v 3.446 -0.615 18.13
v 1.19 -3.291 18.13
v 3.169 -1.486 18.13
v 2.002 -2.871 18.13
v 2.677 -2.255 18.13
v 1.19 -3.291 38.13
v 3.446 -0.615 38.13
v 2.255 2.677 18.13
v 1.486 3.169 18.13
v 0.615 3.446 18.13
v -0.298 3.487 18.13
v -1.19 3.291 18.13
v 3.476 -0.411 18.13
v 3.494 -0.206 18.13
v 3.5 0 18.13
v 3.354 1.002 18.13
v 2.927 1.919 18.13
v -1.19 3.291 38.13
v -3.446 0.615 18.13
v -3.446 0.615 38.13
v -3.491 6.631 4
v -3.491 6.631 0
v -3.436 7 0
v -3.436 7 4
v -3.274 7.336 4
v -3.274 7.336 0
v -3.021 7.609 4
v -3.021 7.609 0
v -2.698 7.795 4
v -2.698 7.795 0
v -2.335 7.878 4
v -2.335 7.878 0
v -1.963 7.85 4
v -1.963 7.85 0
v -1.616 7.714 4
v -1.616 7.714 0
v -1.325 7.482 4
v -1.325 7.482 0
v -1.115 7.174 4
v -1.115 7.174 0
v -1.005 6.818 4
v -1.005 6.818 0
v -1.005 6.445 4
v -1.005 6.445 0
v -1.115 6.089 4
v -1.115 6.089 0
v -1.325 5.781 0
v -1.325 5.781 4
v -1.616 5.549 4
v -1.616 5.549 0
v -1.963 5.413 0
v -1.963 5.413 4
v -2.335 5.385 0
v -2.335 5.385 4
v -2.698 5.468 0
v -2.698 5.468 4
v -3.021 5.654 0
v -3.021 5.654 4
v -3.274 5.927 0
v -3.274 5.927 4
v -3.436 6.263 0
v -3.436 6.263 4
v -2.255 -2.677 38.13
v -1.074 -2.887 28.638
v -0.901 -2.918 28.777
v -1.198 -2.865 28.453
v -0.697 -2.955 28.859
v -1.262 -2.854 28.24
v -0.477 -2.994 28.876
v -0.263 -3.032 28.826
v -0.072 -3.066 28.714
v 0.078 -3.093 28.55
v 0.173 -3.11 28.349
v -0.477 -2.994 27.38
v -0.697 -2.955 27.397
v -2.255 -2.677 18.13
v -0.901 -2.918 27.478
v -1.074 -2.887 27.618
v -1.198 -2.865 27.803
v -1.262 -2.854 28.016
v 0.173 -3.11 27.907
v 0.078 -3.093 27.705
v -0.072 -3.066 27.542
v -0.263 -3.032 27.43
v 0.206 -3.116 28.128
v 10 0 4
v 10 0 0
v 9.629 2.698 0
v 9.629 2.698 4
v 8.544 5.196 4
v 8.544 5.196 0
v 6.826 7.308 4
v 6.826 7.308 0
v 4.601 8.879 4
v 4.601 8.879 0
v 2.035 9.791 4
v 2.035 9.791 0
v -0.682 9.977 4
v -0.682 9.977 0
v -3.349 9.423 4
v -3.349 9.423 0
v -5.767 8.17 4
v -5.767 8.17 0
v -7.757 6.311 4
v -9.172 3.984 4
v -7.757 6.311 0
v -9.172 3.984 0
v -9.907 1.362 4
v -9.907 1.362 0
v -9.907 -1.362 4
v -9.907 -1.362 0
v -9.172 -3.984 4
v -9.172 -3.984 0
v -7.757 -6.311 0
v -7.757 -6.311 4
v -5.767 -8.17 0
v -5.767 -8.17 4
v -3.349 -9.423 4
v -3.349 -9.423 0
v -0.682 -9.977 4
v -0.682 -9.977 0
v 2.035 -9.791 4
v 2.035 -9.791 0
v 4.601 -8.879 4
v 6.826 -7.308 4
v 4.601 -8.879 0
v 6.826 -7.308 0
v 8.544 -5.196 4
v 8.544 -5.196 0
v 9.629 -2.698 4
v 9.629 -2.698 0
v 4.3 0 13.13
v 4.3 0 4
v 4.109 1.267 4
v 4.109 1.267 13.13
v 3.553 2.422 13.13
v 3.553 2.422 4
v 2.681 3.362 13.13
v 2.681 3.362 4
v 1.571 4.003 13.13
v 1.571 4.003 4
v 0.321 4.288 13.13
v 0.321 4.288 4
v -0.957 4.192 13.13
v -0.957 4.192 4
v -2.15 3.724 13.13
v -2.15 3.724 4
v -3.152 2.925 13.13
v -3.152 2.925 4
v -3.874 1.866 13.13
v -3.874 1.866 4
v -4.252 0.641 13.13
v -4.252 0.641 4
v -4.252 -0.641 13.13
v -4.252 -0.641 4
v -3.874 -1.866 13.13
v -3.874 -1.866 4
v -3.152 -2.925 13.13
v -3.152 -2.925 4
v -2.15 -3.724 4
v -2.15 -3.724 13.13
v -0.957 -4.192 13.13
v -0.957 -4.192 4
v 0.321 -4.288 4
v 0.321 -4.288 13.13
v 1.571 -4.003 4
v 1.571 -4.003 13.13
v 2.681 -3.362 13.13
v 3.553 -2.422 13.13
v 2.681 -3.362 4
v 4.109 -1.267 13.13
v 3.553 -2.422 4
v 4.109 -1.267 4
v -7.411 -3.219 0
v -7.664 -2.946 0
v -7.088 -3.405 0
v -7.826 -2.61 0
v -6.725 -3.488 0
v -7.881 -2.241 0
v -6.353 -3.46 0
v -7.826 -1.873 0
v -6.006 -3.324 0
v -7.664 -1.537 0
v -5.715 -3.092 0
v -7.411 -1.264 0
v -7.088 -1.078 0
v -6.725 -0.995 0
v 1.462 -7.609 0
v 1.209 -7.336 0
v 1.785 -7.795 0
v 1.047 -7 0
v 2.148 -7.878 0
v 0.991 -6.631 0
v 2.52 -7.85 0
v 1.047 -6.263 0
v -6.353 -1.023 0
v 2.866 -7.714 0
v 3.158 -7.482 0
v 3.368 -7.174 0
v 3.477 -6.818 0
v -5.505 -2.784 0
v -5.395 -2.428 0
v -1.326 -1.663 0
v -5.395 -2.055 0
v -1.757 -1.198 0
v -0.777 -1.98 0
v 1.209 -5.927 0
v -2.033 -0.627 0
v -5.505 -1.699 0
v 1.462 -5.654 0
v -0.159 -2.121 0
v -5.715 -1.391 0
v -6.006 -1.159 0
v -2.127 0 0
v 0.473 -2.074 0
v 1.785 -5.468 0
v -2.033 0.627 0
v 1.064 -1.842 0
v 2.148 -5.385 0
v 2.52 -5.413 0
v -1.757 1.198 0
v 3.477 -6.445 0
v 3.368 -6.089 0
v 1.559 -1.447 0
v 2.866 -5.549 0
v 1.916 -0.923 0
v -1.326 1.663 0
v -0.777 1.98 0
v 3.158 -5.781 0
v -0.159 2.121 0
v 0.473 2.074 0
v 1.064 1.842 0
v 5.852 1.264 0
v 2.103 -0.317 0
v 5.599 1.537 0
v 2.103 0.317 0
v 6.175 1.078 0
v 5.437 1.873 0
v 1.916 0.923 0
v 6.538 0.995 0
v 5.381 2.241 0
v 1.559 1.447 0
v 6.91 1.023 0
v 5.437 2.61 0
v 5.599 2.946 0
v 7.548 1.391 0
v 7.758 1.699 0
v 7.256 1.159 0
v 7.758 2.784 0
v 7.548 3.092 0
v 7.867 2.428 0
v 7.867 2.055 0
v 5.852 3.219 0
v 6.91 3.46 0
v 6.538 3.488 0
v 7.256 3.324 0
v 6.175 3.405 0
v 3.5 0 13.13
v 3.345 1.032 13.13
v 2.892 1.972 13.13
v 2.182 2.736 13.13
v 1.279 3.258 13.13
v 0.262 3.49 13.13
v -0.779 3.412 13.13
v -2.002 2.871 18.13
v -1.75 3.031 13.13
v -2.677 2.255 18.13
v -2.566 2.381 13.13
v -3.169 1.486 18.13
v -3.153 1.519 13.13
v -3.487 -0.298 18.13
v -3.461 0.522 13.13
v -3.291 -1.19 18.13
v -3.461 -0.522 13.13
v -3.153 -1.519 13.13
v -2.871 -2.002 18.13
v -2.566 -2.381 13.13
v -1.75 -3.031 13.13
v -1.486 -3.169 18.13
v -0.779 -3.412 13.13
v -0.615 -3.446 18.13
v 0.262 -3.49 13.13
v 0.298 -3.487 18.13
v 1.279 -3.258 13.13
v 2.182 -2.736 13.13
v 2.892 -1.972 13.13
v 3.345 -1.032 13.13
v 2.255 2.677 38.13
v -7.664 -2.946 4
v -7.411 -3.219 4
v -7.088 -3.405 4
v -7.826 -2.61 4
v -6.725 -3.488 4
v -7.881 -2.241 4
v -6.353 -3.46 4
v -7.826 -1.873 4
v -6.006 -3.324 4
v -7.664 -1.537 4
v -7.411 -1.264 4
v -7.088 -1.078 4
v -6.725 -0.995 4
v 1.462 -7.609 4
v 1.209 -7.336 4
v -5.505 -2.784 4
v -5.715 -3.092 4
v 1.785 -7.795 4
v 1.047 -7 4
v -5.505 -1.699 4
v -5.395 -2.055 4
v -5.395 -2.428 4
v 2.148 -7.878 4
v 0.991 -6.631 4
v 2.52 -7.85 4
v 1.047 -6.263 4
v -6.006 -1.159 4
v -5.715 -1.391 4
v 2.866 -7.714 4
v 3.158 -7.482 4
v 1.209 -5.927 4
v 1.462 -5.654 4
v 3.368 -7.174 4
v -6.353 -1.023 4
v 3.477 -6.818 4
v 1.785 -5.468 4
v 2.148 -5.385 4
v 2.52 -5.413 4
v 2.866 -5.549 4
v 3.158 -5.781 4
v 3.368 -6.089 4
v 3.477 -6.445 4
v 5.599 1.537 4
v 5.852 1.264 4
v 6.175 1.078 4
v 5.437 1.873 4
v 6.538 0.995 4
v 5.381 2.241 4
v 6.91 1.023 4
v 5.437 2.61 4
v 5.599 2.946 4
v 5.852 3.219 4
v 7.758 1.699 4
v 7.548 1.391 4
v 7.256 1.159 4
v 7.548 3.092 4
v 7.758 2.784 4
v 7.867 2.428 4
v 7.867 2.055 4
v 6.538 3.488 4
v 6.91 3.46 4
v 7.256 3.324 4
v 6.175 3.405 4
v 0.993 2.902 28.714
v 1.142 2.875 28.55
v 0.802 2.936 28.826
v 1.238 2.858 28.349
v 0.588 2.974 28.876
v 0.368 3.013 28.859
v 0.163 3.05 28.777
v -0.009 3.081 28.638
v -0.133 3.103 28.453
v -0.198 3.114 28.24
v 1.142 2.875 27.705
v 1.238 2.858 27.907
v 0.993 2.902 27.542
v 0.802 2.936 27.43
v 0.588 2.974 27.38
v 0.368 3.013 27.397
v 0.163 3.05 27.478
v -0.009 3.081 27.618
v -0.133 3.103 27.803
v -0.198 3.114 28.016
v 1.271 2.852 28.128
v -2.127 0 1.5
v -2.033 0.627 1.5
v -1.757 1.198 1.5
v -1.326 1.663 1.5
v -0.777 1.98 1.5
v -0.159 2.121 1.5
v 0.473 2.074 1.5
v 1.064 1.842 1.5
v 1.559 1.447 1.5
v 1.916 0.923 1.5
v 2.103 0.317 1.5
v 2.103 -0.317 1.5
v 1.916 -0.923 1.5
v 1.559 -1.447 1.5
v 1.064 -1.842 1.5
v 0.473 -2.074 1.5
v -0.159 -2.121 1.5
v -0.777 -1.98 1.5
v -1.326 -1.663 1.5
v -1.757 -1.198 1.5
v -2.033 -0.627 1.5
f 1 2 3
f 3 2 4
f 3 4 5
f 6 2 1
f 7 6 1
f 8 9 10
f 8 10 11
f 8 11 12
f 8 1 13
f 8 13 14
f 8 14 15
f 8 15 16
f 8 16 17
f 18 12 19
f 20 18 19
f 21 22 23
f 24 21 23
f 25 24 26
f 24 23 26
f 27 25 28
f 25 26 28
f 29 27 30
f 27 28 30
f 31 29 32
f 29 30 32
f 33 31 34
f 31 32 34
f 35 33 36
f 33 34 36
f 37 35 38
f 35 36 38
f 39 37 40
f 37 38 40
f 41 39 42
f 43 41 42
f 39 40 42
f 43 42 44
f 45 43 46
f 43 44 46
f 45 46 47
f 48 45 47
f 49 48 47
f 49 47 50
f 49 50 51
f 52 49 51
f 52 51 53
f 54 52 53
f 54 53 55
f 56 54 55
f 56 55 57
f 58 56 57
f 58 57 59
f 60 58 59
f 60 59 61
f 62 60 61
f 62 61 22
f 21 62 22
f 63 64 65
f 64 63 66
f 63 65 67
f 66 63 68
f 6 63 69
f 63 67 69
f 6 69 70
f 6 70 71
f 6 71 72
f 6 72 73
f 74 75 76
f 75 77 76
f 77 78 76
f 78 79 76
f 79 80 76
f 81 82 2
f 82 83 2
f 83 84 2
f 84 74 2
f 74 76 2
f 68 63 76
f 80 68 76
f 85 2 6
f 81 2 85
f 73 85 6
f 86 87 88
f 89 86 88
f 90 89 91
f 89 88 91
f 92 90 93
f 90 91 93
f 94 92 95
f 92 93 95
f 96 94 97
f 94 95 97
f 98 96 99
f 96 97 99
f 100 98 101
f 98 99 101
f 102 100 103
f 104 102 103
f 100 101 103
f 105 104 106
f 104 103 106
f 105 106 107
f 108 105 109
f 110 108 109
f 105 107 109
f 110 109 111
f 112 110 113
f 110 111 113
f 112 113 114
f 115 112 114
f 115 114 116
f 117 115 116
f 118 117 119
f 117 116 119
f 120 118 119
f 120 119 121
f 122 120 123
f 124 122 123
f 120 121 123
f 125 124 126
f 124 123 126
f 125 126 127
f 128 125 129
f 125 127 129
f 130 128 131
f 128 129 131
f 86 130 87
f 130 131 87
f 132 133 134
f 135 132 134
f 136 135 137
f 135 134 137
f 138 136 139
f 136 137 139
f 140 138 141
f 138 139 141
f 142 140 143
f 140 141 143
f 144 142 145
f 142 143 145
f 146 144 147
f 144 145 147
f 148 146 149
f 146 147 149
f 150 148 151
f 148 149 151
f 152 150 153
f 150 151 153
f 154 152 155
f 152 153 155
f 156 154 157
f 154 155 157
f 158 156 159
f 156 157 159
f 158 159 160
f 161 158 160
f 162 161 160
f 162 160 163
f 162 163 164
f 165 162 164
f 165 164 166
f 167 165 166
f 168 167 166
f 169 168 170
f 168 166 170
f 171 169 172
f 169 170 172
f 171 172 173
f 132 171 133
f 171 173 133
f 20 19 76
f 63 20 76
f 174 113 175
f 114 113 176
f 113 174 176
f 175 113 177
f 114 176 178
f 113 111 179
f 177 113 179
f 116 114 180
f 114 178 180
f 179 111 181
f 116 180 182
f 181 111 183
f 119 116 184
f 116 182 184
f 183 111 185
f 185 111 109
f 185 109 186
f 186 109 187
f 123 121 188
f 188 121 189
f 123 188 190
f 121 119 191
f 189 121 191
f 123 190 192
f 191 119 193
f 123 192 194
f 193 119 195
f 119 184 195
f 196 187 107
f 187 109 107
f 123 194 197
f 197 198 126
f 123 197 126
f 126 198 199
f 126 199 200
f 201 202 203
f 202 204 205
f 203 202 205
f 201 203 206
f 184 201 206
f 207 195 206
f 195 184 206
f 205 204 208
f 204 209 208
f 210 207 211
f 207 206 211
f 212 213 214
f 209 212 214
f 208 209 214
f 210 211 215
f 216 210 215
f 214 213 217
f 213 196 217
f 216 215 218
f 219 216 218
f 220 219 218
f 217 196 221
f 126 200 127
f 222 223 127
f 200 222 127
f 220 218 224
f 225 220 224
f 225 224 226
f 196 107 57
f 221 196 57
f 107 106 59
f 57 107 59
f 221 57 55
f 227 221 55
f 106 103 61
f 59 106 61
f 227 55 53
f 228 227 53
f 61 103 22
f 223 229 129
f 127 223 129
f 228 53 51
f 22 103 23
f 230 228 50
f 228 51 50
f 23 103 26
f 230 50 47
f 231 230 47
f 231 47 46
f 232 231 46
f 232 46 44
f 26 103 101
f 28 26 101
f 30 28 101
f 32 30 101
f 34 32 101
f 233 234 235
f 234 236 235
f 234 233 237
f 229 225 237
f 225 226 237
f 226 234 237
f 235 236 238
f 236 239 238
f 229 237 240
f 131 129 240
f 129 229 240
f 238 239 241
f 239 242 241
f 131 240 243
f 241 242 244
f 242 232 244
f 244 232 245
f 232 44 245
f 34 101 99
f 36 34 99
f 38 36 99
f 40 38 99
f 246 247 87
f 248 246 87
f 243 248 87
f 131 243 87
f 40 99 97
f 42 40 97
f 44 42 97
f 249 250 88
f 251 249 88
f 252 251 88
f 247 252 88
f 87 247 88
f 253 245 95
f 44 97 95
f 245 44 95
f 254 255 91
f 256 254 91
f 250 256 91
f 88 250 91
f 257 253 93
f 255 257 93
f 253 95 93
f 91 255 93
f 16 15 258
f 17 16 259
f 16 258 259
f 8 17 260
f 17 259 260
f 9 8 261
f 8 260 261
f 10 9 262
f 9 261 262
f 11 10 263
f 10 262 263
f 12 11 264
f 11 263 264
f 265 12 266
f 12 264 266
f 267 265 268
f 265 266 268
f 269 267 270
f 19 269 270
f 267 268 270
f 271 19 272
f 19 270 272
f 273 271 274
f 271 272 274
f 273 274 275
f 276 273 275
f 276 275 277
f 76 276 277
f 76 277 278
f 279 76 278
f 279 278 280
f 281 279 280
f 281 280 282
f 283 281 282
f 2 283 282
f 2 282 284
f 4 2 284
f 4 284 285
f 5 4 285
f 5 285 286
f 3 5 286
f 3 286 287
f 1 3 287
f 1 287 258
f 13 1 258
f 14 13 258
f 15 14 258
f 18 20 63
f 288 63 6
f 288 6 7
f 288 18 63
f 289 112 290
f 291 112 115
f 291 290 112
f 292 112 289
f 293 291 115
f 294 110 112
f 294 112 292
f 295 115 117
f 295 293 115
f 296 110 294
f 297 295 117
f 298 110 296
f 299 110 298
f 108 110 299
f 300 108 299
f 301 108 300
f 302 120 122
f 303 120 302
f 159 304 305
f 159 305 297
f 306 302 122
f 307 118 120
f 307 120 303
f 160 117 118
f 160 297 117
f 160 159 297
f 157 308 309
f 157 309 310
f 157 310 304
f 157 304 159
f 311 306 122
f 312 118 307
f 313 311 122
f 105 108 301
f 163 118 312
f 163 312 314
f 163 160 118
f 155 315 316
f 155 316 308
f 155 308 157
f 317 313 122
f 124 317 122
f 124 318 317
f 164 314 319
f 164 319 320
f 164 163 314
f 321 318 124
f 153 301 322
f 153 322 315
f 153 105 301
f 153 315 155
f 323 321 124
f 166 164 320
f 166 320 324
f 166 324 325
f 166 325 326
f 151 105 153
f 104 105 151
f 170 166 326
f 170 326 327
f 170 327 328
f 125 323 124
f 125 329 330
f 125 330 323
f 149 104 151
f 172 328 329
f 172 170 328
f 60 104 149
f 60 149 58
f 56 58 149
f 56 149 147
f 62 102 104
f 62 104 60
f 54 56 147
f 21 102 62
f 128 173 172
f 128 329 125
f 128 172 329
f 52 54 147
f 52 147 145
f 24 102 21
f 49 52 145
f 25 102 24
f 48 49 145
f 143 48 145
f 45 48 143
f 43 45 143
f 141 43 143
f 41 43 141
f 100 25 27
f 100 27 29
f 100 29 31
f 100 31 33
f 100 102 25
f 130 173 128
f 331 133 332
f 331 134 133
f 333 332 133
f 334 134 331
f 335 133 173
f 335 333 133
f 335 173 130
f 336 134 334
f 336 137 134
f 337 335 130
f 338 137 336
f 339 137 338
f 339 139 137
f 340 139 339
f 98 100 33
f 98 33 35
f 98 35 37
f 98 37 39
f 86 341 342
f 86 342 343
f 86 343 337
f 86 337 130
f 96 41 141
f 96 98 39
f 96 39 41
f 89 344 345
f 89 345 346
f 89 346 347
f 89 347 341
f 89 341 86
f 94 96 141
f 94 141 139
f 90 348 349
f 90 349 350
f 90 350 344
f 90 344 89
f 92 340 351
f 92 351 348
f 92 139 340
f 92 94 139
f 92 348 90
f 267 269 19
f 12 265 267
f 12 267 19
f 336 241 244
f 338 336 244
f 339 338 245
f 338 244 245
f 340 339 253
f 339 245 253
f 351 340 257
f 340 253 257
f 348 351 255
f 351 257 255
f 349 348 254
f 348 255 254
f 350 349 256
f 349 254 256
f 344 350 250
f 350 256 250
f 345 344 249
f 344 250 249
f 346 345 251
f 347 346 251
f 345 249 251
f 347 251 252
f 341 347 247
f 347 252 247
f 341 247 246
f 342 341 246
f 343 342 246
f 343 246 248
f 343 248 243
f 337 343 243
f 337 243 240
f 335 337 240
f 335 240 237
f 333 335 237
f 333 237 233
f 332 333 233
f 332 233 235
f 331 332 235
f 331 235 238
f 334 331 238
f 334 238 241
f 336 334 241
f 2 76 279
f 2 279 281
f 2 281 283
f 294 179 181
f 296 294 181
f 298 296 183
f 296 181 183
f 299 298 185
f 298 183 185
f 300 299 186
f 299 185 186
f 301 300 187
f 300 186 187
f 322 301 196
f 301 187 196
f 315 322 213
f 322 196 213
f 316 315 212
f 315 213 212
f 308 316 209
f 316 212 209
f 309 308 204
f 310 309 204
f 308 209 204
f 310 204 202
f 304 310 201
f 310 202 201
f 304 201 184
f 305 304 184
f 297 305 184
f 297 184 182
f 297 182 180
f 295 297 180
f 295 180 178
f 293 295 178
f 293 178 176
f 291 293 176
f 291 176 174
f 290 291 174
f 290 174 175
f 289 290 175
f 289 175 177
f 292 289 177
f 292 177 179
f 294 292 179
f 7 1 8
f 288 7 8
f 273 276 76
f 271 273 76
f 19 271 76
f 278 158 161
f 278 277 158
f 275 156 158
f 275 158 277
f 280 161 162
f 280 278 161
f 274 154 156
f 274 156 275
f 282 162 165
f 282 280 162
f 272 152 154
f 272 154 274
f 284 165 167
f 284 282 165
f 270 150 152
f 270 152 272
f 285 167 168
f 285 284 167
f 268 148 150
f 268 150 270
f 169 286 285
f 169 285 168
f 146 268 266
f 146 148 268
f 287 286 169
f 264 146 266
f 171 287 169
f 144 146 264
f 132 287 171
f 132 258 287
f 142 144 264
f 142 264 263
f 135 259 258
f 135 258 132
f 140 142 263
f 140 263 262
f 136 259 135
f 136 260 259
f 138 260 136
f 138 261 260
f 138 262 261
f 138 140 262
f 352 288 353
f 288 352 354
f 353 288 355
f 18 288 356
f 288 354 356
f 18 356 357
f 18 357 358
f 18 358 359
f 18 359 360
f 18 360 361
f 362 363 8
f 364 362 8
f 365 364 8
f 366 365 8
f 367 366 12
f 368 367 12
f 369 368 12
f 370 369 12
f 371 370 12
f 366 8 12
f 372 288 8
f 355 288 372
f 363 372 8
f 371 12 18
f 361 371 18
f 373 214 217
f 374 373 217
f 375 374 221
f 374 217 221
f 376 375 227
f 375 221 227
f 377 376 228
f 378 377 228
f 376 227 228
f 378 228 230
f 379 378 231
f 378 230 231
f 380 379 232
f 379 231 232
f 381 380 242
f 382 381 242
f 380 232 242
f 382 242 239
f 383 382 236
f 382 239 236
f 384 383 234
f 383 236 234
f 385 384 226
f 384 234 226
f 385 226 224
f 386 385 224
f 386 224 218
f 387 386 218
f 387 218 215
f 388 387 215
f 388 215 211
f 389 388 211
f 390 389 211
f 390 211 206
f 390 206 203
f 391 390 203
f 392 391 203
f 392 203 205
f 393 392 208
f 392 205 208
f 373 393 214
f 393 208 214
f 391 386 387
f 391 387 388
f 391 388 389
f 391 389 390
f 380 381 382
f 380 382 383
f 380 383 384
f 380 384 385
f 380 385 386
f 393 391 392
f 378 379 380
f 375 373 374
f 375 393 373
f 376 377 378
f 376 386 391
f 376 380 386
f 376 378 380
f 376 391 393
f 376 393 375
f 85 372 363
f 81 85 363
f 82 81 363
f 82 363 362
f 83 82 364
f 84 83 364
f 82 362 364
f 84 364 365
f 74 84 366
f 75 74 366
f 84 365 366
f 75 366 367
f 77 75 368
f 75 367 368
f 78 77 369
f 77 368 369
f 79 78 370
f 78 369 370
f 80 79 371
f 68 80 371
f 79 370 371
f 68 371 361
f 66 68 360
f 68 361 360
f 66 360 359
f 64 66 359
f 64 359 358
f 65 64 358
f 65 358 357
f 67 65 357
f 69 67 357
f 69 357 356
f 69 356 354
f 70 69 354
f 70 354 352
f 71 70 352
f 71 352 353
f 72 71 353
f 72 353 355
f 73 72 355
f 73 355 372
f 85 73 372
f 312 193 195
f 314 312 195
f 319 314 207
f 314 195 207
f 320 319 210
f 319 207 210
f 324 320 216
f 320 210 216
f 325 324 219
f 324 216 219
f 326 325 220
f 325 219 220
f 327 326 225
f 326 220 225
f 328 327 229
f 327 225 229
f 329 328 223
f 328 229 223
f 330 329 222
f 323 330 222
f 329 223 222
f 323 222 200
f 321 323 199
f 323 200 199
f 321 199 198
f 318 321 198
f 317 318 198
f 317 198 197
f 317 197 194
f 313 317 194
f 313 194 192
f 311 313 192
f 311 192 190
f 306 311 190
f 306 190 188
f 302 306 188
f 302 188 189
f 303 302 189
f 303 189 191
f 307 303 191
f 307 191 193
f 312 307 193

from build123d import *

# Parameters (mm, degrees)
ESQUISSE1_R             = 10
BOSS_EXTRU_1_DEPTH      = 4
ESQUISSE2_R             = 3.5
BOSS_EXTRU_2_DEPTH      = 14.13
BOSS_EXTRU_3_DEPTH      = 20
ESQUISSE4_R             = 1.25
ENL_V_MAT_EXTRU_1_DEPTH = 100
ESQUISSE5_R             = 0.75
ENL_V_MAT_EXTRU_2_DEPTH = 14
ESQUISSE6_R             = 2.127089322
ENL_V_MAT_EXTRU_3_DEPTH = 1.5
ESQUISSE7_R             = 4.3
ESQUISSE7_R_2           = 3.5
BOSS_EXTRU_4_DEPTH      = 9.13


with BuildPart() as part:
    # Esquisse1 → Boss.-Extru.1 (new body)
    with BuildSketch(Plane.XY):
        Circle(ESQUISSE1_R)
    extrude(amount=BOSS_EXTRU_1_DEPTH)

    # Esquisse2 → Boss.-Extru.2 (add)
    with BuildSketch(Plane.XY.offset(4)):
        Circle(ESQUISSE2_R)
    extrude(amount=BOSS_EXTRU_2_DEPTH)

    # Esquisse3 → Boss.-Extru.3 (add)
    with BuildSketch(Plane.XY.offset(18.13)):
        Polygon((-1.190476286, 3.29131679), (-3.445602095, 0.614675689), (-2.255125809, -2.676641101), (1.190476286, -3.29131679), (3.445602095, -0.614675689), (2.255125809, 2.676641101), align=None)
    extrude(amount=BOSS_EXTRU_3_DEPTH)

    # Esquisse4 → Enlèv. mat.-Extru.1 (cut)
    with BuildSketch(Plane(origin=(0, 0, 0), x_dir=(-1, 0, 0), z_dir=(0, 0, -1))):
        with Locations((2.241387648, 6.631453944)):
            Circle(ESQUISSE4_R)
        with Locations((-6.631453944, 2.241387648)):
            Circle(ESQUISSE4_R)
        with Locations((6.631453944, -2.241387648)):
            Circle(ESQUISSE4_R)
        with Locations((-2.241387648, -6.631453944)):
            Circle(ESQUISSE4_R)
    extrude(amount=-ENL_V_MAT_EXTRU_1_DEPTH, mode=Mode.SUBTRACT)

    # Esquisse5 → Enlèv. mat.-Extru.2 (cut)
    with BuildSketch(Plane(origin=(0.532324762, 2.983978946, 0), x_dir=(0.984457741, -0.175621625, 0), z_dir=(0.175621625, 0.984457741, 0))):
        with Locations((0, -28.127949192)):
            Circle(ESQUISSE5_R)
    extrude(amount=-ENL_V_MAT_EXTRU_2_DEPTH, mode=Mode.SUBTRACT)

    # Esquisse6 → Enlèv. mat.-Extru.3 (cut)
    with BuildSketch(Plane(origin=(0, 0, 0), x_dir=(-1, 0, 0), z_dir=(0, 0, -1))):
        Circle(ESQUISSE6_R)
    extrude(amount=-ENL_V_MAT_EXTRU_3_DEPTH, mode=Mode.SUBTRACT)

    # Esquisse7 → Boss.-Extru.4 (add)
    with BuildSketch(Plane.XY.offset(4)):
        Circle(ESQUISSE7_R)
        Circle(ESQUISSE7_R_2, mode=Mode.SUBTRACT)
    extrude(amount=BOSS_EXTRU_4_DEPTH)


solid = part.part
